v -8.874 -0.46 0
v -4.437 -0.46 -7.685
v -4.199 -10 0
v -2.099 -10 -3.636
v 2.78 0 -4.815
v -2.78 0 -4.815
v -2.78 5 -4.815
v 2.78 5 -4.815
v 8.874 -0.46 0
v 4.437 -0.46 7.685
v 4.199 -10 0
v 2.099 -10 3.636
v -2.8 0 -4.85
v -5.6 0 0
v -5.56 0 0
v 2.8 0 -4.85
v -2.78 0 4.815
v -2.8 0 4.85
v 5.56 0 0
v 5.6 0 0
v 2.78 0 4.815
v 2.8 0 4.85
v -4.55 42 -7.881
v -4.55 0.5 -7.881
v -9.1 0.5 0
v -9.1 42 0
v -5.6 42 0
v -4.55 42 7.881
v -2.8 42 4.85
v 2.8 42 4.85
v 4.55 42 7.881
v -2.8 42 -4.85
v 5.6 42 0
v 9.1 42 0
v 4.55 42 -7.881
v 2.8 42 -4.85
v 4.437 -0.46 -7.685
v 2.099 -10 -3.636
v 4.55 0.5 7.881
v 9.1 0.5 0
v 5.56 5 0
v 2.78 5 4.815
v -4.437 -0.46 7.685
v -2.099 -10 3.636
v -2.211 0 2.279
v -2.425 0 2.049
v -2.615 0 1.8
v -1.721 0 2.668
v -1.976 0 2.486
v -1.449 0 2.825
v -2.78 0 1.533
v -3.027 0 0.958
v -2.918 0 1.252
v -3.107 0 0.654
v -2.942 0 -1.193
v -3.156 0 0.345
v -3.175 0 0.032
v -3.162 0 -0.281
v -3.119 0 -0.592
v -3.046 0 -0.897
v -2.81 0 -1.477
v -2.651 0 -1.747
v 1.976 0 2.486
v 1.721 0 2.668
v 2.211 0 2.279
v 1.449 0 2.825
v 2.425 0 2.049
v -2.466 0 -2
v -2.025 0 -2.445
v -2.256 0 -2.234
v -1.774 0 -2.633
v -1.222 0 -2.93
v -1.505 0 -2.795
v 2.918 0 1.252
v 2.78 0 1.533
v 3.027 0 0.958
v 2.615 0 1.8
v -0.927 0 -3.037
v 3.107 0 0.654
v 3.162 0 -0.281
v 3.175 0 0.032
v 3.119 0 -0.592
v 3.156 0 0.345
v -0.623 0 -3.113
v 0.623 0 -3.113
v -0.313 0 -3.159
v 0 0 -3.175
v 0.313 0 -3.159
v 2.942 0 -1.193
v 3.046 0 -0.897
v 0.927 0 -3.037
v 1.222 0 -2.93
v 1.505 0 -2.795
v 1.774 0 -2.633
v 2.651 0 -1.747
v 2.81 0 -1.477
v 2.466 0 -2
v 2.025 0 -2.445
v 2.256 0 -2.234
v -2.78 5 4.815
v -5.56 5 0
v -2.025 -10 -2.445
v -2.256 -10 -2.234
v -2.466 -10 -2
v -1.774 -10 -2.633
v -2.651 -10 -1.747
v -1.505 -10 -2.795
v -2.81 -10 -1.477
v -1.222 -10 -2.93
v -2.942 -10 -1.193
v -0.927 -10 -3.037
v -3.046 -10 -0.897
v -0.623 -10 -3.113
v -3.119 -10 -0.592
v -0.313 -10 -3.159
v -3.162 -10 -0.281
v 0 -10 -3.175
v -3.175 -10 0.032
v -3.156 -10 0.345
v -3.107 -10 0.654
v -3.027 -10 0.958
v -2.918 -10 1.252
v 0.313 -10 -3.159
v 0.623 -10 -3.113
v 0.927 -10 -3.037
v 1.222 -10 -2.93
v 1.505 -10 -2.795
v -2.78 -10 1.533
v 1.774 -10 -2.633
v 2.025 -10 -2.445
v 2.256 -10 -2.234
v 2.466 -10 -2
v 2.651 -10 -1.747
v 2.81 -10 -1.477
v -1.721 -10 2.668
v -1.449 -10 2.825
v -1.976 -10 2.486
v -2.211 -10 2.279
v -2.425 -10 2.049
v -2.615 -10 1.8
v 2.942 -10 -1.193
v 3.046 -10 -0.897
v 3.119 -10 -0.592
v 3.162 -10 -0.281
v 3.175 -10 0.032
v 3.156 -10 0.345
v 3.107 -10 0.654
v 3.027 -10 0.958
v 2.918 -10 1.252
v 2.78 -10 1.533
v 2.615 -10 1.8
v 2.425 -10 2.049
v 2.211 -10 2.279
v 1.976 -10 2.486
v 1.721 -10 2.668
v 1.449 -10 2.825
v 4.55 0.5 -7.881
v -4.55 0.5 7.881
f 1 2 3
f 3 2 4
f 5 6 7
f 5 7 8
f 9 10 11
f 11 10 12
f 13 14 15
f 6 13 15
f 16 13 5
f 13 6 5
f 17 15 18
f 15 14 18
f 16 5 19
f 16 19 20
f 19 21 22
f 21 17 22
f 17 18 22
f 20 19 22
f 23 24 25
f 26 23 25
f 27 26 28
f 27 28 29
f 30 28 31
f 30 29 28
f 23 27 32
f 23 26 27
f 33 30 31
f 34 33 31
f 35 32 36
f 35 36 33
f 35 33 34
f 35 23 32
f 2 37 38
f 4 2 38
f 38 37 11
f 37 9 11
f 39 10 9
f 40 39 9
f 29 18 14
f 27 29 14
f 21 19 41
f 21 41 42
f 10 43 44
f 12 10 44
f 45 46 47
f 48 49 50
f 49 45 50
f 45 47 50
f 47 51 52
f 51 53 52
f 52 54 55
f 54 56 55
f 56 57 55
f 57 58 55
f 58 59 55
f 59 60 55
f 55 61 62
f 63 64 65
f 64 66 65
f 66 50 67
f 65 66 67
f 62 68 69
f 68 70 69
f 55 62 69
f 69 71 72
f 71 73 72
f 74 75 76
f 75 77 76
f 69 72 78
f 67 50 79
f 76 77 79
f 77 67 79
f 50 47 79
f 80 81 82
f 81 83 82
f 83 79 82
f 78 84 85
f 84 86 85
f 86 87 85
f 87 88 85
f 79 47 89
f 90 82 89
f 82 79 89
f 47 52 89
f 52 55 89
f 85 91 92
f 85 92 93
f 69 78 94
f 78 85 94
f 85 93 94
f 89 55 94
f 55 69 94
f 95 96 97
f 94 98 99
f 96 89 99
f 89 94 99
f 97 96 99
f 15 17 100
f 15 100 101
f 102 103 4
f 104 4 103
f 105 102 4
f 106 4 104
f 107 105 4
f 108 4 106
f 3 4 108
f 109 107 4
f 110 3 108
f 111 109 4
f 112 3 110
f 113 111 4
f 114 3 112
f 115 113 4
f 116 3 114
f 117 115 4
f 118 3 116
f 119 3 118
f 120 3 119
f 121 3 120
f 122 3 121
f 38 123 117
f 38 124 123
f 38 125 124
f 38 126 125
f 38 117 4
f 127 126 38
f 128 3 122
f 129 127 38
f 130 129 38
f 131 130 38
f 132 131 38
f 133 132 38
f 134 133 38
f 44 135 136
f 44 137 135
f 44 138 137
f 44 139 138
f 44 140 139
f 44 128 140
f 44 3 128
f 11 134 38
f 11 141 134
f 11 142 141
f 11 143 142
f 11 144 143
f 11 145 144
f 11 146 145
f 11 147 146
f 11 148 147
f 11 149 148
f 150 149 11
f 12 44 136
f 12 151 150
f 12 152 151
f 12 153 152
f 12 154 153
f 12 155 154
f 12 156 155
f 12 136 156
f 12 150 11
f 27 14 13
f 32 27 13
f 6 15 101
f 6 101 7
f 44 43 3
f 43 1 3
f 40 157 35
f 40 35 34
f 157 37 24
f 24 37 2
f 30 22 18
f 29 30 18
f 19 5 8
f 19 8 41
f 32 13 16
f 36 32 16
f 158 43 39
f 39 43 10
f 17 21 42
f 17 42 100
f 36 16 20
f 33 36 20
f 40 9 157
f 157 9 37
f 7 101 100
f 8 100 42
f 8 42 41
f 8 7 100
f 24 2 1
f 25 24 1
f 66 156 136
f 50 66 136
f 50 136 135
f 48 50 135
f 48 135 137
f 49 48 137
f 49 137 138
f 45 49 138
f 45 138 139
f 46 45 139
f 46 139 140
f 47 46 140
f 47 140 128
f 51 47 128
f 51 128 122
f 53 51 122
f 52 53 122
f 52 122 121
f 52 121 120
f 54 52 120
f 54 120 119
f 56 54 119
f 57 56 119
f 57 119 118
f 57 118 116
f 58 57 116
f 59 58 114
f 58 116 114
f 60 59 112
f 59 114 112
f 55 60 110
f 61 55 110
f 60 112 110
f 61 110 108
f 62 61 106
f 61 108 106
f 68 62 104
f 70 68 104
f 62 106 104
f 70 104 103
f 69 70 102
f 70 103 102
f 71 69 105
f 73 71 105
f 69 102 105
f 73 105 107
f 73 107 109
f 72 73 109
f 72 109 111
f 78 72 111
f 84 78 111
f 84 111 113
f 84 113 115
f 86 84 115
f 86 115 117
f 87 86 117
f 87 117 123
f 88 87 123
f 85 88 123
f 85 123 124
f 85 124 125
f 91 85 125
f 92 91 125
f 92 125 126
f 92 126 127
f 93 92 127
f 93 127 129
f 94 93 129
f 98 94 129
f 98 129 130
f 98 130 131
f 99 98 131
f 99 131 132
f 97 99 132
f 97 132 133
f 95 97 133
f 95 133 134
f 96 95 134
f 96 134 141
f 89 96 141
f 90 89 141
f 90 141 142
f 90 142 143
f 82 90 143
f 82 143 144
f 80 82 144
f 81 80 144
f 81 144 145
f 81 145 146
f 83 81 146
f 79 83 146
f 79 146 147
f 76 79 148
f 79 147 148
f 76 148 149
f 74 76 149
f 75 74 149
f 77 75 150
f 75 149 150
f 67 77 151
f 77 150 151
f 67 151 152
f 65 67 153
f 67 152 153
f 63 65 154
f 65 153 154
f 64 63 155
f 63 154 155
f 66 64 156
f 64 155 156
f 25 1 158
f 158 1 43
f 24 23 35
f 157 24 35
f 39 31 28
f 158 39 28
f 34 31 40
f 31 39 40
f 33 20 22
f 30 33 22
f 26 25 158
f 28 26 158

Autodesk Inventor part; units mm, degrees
ref_plane "YZ Plane" through (0, 0, 0) normal (1, 0, 0) x (0, 1, 0)
ref_plane "XZ Plane" through (0, 0, 0) normal (0, 1, 0) x (-1, 0, 0)
ref_plane "XY Plane" through (0, 0, 0) normal (0, 0, 1) x (1, 0, 0)
sketch "Boceto11" plane through (0, 0, 0) normal (0, 1, 0) x (-1, 0, 0)
  line L0 (0, 0) -> (5.6, 0)
  line L1 (5.6, 0) -> (2.8, -4.8497)
  line L2 (2.8, -4.8497) -> (-2.8, -4.8497)
  line L3 (-2.8, -4.8497) -> (-5.6, 0)
  line L4 (-5.6, 0) -> (-2.8, 4.8497)
  line L5 (-2.8, 4.8497) -> (2.8, 4.8497)
  line L6 (2.8, 4.8497) -> (5.6, 0)
  line L7 (5.6, 0) -> (9.1, 0)
  line L8 (9.1, 0) -> (4.55, -7.8808)
  line L9 (4.55, -7.8808) -> (-4.55, -7.8808)
  line L10 (-4.55, -7.8808) -> (-9.1, 0)
  line L11 (-9.1, 0) -> (-4.55, 7.8808)
  line L12 (-4.55, 7.8808) -> (4.55, 7.8808)
  line L13 (4.55, 7.8808) -> (9.1, 0)
  dimension "d42" = 5.6
  dimension "d43" = 3.5
extrude "Extrusión10" add sketch "Boceto11" along normal blind 32
sketch "Boceto16" plane through (0, 0, 0) normal (0, -1, 0) x (1, 0, 0)
  line L0 (4.55, 7.8808) -> (9.1, 0) projected
  line L1 (9.1, 0) -> (4.55, -7.8808)
  line L2 (4.55, -7.8808) -> (-4.55, -7.8808)
  line L3 (-4.55, -7.8808) -> (-9.1, 0)
  line L4 (-9.1, 0) -> (-4.55, 7.8808)
  line L5 (-4.55, 7.8808) -> (4.55, 7.8808)
  line L6 (4.55, 7.8808) -> (9.1, 0)
  point P0 (0, 0)
  point P1 (0, 0)
extrude "Extrusión14" add sketch "Boceto16" along normal blind 10 draft -23
sketch "Boceto19" plane through (0, -10, 0) normal (0, -1, 0) x (1, 0, 0)
  line L0 (-2.0993, 3.6361) -> (2.0993, 3.6361) projected
  line L1 (2.0993, -3.6361) -> (-2.0993, -3.6361) projected
  line L2 (2.0993, 3.6361) -> (4.1986, 0) projected
  line L3 (-4.55, -7.8808) -> (-2.0993, -3.6361) projected
  line L4 (-4.1986, 0) -> (-2.0993, 3.6361) projected
  arc A0 (-1.4491, 2.825) -> (1.4491, 2.825) centre (0, 0) ccw
  line L5 (0, 2.825) -> (-1.4491, 2.825)
  line L6 (0, 2.825) -> (1.4491, 2.825)
extrude "Extrusión16" cut sketch "Boceto19" against normal blind 15
sketch "Boceto20" plane through (0, 0, 0) normal (0, 1, 0) x (1, 0, 0)
  line L0 (-4.55, -7.8808) -> (-2.0993, -3.6361) projected
  line L1 (-2.7798, -4.8148) -> (-5.5597, 0)
  line L2 (-5.5597, 0) -> (-2.7798, 4.8148)
  line L3 (-2.7798, 4.8148) -> (2.7798, 4.8148)
  line L4 (2.7798, 4.8148) -> (5.5597, 0)
  line L5 (5.5597, 0) -> (2.7798, -4.8148)
  line L6 (2.7798, -4.8148) -> (-2.7798, -4.8148)
  point P0 (0, 0)
  point P1 (0, 0)
extrude "Extrusión17" add sketch "Boceto20" along normal blind 5
sketch "Boceto21" plane through (0, 32, 0) normal (0, 1, 0) x (1, 0, 0)
  line L0 (-5.6, 0) -> (-2.8, 4.8497)
  line L1 (-2.8, 4.8497) -> (2.8, 4.8497)
  line L2 (2.8, 4.8497) -> (5.6, 0)
  line L3 (5.6, 0) -> (2.8, -4.8497)
  line L4 (2.8, -4.8497) -> (-2.8, -4.8497)
  line L5 (-2.8, -4.8497) -> (-5.6, 0)
  line L6 (-2.8, -4.8497) -> (-5.6, 0) projected
  line L7 (-9.1, 0) -> (-4.55, -7.8808) projected
  line L8 (-4.55, -7.8808) -> (-9.1, 0)
  line L9 (-4.55, 7.8808) -> (-9.1, 0) projected
  line L10 (-9.1, 0) -> (-4.55, 7.8808)
  line L11 (4.55, 7.8808) -> (2.0993, 3.6361) projected
  line L12 (-4.55, 7.8808) -> (4.55, 7.8808)
  line L13 (4.55, -7.8808) -> (9.1, 0) projected
  line L14 (4.55, 7.8808) -> (9.1, 0)
  line L15 (9.1, 0) -> (4.55, -7.8808)
  line L16 (4.55, -7.8808) -> (-4.55, -7.8808)
  point P0 (0, 0)
  point P1 (0, 0)
  point P2 (0, 0)
chamfer "Chaflán1" distance 0.5 angle 45 6 edges at (0, 0, -7.8808) (-6.825, 0, -3.9404) (6.825, 0, -3.9404) (-6.825, 0, 3.9404) (0, 0, 7.8808) (6.825, 0, 3.9404)
extrude "Extrusión19" add sketch "Boceto21" along normal blind 10
properties part number "Bobinatge - acoplament eix"
